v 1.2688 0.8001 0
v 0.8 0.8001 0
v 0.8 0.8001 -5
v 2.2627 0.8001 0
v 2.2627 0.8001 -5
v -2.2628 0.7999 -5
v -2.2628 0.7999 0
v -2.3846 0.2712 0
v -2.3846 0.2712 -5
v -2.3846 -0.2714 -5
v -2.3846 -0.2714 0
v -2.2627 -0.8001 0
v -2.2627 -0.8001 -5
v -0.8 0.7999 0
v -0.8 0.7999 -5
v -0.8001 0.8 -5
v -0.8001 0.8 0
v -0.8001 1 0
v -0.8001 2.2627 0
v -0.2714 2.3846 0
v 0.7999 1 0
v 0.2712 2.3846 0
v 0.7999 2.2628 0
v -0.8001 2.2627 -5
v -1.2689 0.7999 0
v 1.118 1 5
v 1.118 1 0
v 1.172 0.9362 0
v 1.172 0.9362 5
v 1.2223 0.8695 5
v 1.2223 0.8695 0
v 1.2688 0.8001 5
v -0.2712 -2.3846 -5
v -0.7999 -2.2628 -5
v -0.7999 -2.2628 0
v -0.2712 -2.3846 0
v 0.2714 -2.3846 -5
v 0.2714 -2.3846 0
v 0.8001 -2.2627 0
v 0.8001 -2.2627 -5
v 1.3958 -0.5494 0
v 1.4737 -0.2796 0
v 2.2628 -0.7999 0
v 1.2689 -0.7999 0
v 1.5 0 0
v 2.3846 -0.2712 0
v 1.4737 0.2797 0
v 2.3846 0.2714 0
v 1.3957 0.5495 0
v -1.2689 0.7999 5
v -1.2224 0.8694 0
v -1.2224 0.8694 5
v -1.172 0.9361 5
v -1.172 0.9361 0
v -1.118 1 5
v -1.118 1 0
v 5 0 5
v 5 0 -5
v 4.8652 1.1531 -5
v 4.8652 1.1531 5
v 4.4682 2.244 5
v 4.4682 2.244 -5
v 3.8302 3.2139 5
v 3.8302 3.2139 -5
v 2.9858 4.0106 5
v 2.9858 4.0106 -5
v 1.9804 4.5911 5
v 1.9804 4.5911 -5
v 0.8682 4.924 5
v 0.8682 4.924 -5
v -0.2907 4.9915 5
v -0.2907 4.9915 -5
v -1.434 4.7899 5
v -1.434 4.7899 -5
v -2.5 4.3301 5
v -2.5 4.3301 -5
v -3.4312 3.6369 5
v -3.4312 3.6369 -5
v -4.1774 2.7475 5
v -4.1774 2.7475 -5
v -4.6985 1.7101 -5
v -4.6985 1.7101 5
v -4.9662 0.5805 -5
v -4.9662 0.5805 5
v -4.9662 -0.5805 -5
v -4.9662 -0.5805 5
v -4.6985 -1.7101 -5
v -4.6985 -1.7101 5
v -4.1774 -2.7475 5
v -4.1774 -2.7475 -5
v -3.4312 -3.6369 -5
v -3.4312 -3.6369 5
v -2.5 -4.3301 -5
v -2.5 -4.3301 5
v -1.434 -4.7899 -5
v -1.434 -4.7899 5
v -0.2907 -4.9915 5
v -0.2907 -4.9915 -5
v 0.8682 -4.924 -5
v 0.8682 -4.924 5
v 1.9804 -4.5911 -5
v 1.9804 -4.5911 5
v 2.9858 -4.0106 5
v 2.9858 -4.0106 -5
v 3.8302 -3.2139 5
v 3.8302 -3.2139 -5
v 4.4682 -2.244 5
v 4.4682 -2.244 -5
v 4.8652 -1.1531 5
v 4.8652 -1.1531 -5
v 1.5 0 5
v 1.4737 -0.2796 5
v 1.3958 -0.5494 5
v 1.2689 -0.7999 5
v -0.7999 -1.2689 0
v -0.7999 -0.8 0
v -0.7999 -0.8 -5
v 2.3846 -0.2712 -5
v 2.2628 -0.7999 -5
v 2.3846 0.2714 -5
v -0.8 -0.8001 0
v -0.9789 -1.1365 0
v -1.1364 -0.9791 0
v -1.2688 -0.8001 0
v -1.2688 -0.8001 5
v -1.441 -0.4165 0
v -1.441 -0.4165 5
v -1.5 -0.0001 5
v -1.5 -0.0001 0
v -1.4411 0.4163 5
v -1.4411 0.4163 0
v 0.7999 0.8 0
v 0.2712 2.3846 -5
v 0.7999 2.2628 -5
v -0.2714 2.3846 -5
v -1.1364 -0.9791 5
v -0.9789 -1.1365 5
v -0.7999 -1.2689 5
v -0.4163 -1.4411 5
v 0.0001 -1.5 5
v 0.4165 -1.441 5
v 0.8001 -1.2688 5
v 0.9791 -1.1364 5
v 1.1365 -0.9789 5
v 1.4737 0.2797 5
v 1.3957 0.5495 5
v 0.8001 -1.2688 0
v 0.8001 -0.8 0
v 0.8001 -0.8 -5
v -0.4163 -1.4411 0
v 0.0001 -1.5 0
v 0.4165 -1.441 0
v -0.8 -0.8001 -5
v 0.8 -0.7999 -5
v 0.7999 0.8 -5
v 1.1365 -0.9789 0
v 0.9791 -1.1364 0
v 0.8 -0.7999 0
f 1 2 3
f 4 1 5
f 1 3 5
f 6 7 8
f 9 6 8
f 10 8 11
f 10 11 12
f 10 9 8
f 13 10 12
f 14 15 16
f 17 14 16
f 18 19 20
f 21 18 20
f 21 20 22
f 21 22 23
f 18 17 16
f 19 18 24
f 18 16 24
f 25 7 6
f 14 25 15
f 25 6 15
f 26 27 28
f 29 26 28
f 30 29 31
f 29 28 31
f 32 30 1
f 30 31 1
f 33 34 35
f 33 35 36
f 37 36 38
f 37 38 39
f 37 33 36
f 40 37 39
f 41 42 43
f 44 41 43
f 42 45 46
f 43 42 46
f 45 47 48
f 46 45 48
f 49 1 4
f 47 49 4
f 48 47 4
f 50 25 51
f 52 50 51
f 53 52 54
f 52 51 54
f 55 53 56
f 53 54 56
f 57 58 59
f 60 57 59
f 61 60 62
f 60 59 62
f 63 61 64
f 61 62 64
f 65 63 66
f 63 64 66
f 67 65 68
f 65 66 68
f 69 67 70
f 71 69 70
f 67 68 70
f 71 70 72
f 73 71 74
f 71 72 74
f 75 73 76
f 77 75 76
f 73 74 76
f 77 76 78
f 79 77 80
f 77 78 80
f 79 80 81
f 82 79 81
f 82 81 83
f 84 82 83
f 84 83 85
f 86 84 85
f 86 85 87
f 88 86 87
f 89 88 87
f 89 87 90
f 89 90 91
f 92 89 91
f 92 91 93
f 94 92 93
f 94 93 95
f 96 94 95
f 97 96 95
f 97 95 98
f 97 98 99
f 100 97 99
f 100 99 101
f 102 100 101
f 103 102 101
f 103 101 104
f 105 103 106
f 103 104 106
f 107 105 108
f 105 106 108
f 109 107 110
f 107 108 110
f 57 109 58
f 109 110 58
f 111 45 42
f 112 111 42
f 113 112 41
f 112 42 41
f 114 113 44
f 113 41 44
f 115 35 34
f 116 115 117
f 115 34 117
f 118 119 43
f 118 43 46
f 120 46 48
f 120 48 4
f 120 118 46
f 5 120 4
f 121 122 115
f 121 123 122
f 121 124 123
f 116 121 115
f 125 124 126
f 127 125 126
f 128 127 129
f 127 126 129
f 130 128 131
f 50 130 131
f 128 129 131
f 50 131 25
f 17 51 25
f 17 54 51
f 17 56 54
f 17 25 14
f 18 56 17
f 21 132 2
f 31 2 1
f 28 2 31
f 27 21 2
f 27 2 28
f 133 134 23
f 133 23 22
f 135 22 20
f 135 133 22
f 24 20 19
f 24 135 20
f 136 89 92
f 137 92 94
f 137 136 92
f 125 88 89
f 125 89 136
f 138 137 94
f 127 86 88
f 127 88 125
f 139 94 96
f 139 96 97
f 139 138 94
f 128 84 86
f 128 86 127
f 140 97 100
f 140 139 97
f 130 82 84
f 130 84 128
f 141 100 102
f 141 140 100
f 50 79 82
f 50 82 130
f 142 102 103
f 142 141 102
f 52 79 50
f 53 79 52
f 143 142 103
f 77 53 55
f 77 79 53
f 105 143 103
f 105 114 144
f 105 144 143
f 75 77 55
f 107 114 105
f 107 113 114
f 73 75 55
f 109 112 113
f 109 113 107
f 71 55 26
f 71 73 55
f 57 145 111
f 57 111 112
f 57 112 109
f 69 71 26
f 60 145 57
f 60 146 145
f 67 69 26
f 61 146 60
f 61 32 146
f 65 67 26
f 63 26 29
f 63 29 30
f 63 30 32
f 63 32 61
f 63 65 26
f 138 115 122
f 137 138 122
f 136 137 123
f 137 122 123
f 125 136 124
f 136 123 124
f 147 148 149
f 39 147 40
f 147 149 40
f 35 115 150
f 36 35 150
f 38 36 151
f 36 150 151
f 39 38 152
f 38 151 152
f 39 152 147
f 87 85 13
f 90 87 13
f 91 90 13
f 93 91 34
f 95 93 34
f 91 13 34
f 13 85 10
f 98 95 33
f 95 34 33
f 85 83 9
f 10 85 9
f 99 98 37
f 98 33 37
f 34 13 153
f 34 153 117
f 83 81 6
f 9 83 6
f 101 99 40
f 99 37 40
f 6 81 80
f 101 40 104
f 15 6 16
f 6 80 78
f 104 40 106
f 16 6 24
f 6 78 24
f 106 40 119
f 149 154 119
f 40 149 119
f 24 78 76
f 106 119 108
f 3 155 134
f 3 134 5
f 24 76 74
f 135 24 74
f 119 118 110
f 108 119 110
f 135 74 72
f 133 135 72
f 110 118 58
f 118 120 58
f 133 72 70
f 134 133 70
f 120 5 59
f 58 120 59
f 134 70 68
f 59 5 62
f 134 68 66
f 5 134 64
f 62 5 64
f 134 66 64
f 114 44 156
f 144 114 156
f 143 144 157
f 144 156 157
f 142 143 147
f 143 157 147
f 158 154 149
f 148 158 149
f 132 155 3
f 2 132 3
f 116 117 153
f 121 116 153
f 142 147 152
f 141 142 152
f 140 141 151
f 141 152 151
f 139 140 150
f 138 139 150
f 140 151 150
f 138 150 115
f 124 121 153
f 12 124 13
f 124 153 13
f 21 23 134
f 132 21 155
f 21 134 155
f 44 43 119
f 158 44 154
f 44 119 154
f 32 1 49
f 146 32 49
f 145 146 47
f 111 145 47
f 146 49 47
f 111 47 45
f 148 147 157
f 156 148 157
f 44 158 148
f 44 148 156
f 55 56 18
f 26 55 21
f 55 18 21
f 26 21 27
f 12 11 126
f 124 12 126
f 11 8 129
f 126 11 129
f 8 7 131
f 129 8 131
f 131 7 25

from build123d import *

# Parameters (mm, degrees)
SKETCH1_R           = 5
SKETCH1_R_2         = 2.400014974
BOSS_EXTRUDE1_DEPTH = 5
BOSS_EXTRUDE2_START = -5
SKETCH1_5_R         = 5
SKETCH1_5_R_2       = 2.400014974
BOSS_EXTRUDE2_DEPTH = 5


with BuildPart() as part:
    # Sketch1 → Boss-Extrude1 (new body)
    # profile 1 of 12: a face of its own
    with BuildSketch(Plane.XY):
        Circle(SKETCH1_R)
        Circle(SKETCH1_R_2, mode=Mode.SUBTRACT)
    # profile 2 of 12: a face of its own
    with BuildSketch(Plane.XY):
        with BuildLine():
            ThreePointArc((-0.799911499, -1.268913549), (-1.060590017, -1.060730322), (-1.268807724, -0.800079346))
            Line((-1.268807724, -0.800079346), (-2.262729528, -0.800079346))
            ThreePointArc((-2.262729528, -0.800079346), (-1.69700392, -1.697129804), (-0.799911499, -2.26278887))
            Line((-0.799911499, -2.26278887), (-0.799911499, -1.268913549))
        make_face()
    # profile 3 of 12: a face of its own
    with BuildSketch(Plane.XY):
        with BuildLine():
            ThreePointArc((0.800079346, -1.268807724), (9.9211e-05, -1.499999997), (-0.799911499, -1.268913549))
            Line((-0.799911499, -1.268913549), (-0.799911499, -2.26278887))
            ThreePointArc((-0.799911499, -2.26278887), (8.9014e-05, -2.400014973), (0.800079346, -2.262729528))
            Line((0.800079346, -2.262729528), (0.800079346, -1.268807724))
        make_face()
    # profile 4 of 12: a face of its own
    with BuildSketch(Plane.XY):
        with BuildLine():
            ThreePointArc((-1.268807724, -0.800079346), (-1.499999997, -9.9211e-05), (-1.268913549, 0.799911499))
            Line((-1.268913549, 0.799911499), (-2.26278887, 0.799911499))
            ThreePointArc((-2.26278887, 0.799911499), (-2.400014973, -8.9014e-05), (-2.262729528, -0.800079346))
            Line((-2.262729528, -0.800079346), (-1.268807724, -0.800079346))
        make_face()
    # profile 5 of 12: a face of its own
    with BuildSketch(Plane.XY):
        with BuildLine():
            ThreePointArc((-1.268913549, 0.799911499), (-1.197659588, 0.903112126), (-1.118033989, 1))
            ThreePointArc((-1.118033989, 1), (-0.96842867, 1.145489376), (-0.800079346, 1.268807724))
            Line((-0.800079346, 1.268807724), (-0.800079346, 2.262729528))
            ThreePointArc((-0.800079346, 2.262729528), (-1.697129804, 1.69700392), (-2.26278887, 0.799911499))
            Line((-2.26278887, 0.799911499), (-1.268913549, 0.799911499))
        make_face()
    # profile 6 of 12: a face of its own
    with BuildSketch(Plane.XY):
        with BuildLine():
            Line((-0.800079346, 2.262729528), (-0.800079346, 1.268807724))
            ThreePointArc((-0.800079346, 1.268807724), (-9.9211e-05, 1.499999997), (0.799911499, 1.268913549))
            Line((0.799911499, 1.268913549), (0.799911499, 2.26278887))
            ThreePointArc((0.799911499, 2.26278887), (-8.9014e-05, 2.400014973), (-0.800079346, 2.262729528))
        make_face()
    # profile 7 of 12: a face of its own
    with BuildSketch(Plane.XY):
        with BuildLine():
            Line((0.799911499, 2.26278887), (0.799911499, 1.268913549))
            ThreePointArc((0.799911499, 1.268913549), (0.968352905, 1.145553426), (1.118033989, 1))
            ThreePointArc((1.118033989, 1), (1.197599853, 0.903191338), (1.268807724, 0.800079346))
            Line((1.268807724, 0.800079346), (2.262729528, 0.800079346))
            ThreePointArc((2.262729528, 0.800079346), (1.69700392, 1.697129804), (0.799911499, 2.26278887))
        make_face()
    # profile 8 of 12: a face of its own
    with BuildSketch(Plane.XY):
        with BuildLine():
            Line((2.262729528, 0.800079346), (1.268807724, 0.800079346))
            ThreePointArc((1.268807724, 0.800079346), (1.4410433, 0.4164063), (1.5, 0))
            ThreePointArc((1.5, 0), (1.441070838, -0.416310988), (1.268913549, -0.799911499))
            Line((1.268913549, -0.799911499), (2.26278887, -0.799911499))
            ThreePointArc((2.26278887, -0.799911499), (2.365459685, -0.405798414), (2.400014974, 0))
            ThreePointArc((2.400014974, 0), (2.365444633, 0.405886146), (2.262729528, 0.800079346))
        make_face()
    # profile 9 of 12: a face of its own
    with BuildSketch(Plane.XY):
        with BuildLine():
            ThreePointArc((1.268913549, -0.799911499), (1.060730322, -1.060590017), (0.800079346, -1.268807724))
            Line((0.800079346, -1.268807724), (0.800079346, -2.262729528))
            ThreePointArc((0.800079346, -2.262729528), (1.697129804, -1.69700392), (2.26278887, -0.799911499))
            Line((2.26278887, -0.799911499), (1.268913549, -0.799911499))
        make_face()
    # profile 10 of 12: a face of its own
    with BuildSketch(Plane.XY):
        with BuildLine():
            Line((-0.800079346, 1.268807724), (-0.800079346, 1))
            Line((-0.800079346, 1), (0.799911499, 1))
            Line((0.799911499, 1), (0.799911499, 1.268913549))
            ThreePointArc((0.799911499, 1.268913549), (-9.9211e-05, 1.499999997), (-0.800079346, 1.268807724))
        make_face()
    # profile 11 of 12: a face of its own
    with BuildSketch(Plane.XY):
        with BuildLine():
            Line((0.799911499, 1.268913549), (0.799911499, 1))
            Line((0.799911499, 1), (1.118033989, 1))
            ThreePointArc((1.118033989, 1), (0.968352905, 1.145553426), (0.799911499, 1.268913549))
        make_face()
    # profile 12 of 12: a face of its own
    with BuildSketch(Plane.XY):
        with BuildLine():
            ThreePointArc((-0.800079346, 1.268807724), (-0.96842867, 1.145489376), (-1.118033989, 1))
            Line((-1.118033989, 1), (-0.800079346, 1))
            Line((-0.800079346, 1), (-0.800079346, 1.268807724))
        make_face()
    extrude(amount=BOSS_EXTRUDE1_DEPTH)

    # Sketch1<5> → Boss-Extrude2 (add)
    # profile 1 of 11: a face of its own
    with BuildSketch(Plane.XY.offset(BOSS_EXTRUDE2_START)):
        Circle(SKETCH1_5_R)
        Circle(SKETCH1_5_R_2, mode=Mode.SUBTRACT)
    # profile 2 of 11: a face of its own
    with BuildSketch(Plane.XY.offset(BOSS_EXTRUDE2_START)):
        with BuildLine():
            ThreePointArc((1.268913549, -0.799911499), (1.060730322, -1.060590017), (0.800079346, -1.268807724))
            Line((0.800079346, -1.268807724), (0.800079346, -2.262729528))
            ThreePointArc((0.800079346, -2.262729528), (1.697129804, -1.69700392), (2.26278887, -0.799911499))
            Line((2.26278887, -0.799911499), (1.268913549, -0.799911499))
        make_face()
    # profile 3 of 11: a face of its own
    with BuildSketch(Plane.XY.offset(BOSS_EXTRUDE2_START)):
        with BuildLine():
            Line((0.799911499, 2.26278887), (0.799911499, 1.268913549))
            ThreePointArc((0.799911499, 1.268913549), (0.968352905, 1.145553426), (1.118033989, 1))
            ThreePointArc((1.118033989, 1), (1.197599853, 0.903191338), (1.268807724, 0.800079346))
            Line((1.268807724, 0.800079346), (2.262729528, 0.800079346))
            ThreePointArc((2.262729528, 0.800079346), (1.69700392, 1.697129804), (0.799911499, 2.26278887))
        make_face()
    # profile 4 of 11: a face of its own
    with BuildSketch(Plane.XY.offset(BOSS_EXTRUDE2_START)):
        with BuildLine():
            ThreePointArc((-1.268913549, 0.799911499), (-1.197659588, 0.903112126), (-1.118033989, 1))
            ThreePointArc((-1.118033989, 1), (-0.96842867, 1.145489376), (-0.800079346, 1.268807724))
            Line((-0.800079346, 1.268807724), (-0.800079346, 2.262729528))
            ThreePointArc((-0.800079346, 2.262729528), (-1.697129804, 1.69700392), (-2.26278887, 0.799911499))
            Line((-2.26278887, 0.799911499), (-1.268913549, 0.799911499))
        make_face()
    # profile 5 of 11: a face of its own
    with BuildSketch(Plane.XY.offset(BOSS_EXTRUDE2_START)):
        with BuildLine():
            ThreePointArc((-0.799911499, -1.268913549), (-1.060590017, -1.060730322), (-1.268807724, -0.800079346))
            Line((-1.268807724, -0.800079346), (-2.262729528, -0.800079346))
            ThreePointArc((-2.262729528, -0.800079346), (-1.69700392, -1.697129804), (-0.799911499, -2.26278887))
            Line((-0.799911499, -2.26278887), (-0.799911499, -1.268913549))
        make_face()
    # profile 6 of 11: a face of its own
    with BuildSketch(Plane.XY.offset(BOSS_EXTRUDE2_START)):
        with BuildLine():
            Line((0.799911499, 1.268913549), (0.799911499, 1))
            Line((0.799911499, 1), (1.118033989, 1))
            ThreePointArc((1.118033989, 1), (0.968352905, 1.145553426), (0.799911499, 1.268913549))
        make_face()
    # profile 7 of 11: a face of its own
    with BuildSketch(Plane.XY.offset(BOSS_EXTRUDE2_START)):
        with BuildLine():
            ThreePointArc((-0.800079346, 1.268807724), (-0.96842867, 1.145489376), (-1.118033989, 1))
            Line((-1.118033989, 1), (-0.800079346, 1))
            Line((-0.800079346, 1), (-0.800079346, 1.268807724))
        make_face()
    # profile 8 of 11: a face of its own
    with BuildSketch(Plane.XY.offset(BOSS_EXTRUDE2_START)):
        with BuildLine():
            Line((-0.800079346, 1), (-1.118033989, 1))
            ThreePointArc((-1.118033989, 1), (-1.197659588, 0.903112126), (-1.268913549, 0.799911499))
            Line((-1.268913549, 0.799911499), (-0.800017929, 0.799911499))
            Line((-0.800017929, 0.799911499), (-0.800079346, 0.800017929))
            Line((-0.800079346, 0.800017929), (-0.800079346, 1))
        make_face()
    # profile 9 of 11: a face of its own
    with BuildSketch(Plane.XY.offset(BOSS_EXTRUDE2_START)):
        with BuildLine():
            Line((1.118033989, 1), (0.799911499, 1))
            Line((0.799911499, 1), (0.799911499, 0.800017929))
            Line((0.799911499, 0.800017929), (0.800017929, 0.800079346))
            Line((0.800017929, 0.800079346), (1.268807724, 0.800079346))
            ThreePointArc((1.268807724, 0.800079346), (1.197599853, 0.903191338), (1.118033989, 1))
        make_face()
    # profile 10 of 11: a face of its own
    with BuildSketch(Plane.XY.offset(BOSS_EXTRUDE2_START)):
        with BuildLine():
            Line((0.800079346, -0.800017929), (0.800079346, -1.268807724))
            ThreePointArc((0.800079346, -1.268807724), (1.060730322, -1.060590017), (1.268913549, -0.799911499))
            Line((1.268913549, -0.799911499), (0.800017929, -0.799911499))
            Line((0.800017929, -0.799911499), (0.800079346, -0.800017929))
        make_face()
    # profile 11 of 11: a face of its own
    with BuildSketch(Plane.XY.offset(BOSS_EXTRUDE2_START)):
        with BuildLine():
            Line((-0.800017929, -0.800079346), (-1.268807724, -0.800079346))
            ThreePointArc((-1.268807724, -0.800079346), (-1.060590017, -1.060730322), (-0.799911499, -1.268913549))
            Line((-0.799911499, -1.268913549), (-0.799911499, -0.800017929))
            Line((-0.799911499, -0.800017929), (-0.800017929, -0.800079346))
        make_face()
    extrude(amount=BOSS_EXTRUDE2_DEPTH)


solid = part.part
